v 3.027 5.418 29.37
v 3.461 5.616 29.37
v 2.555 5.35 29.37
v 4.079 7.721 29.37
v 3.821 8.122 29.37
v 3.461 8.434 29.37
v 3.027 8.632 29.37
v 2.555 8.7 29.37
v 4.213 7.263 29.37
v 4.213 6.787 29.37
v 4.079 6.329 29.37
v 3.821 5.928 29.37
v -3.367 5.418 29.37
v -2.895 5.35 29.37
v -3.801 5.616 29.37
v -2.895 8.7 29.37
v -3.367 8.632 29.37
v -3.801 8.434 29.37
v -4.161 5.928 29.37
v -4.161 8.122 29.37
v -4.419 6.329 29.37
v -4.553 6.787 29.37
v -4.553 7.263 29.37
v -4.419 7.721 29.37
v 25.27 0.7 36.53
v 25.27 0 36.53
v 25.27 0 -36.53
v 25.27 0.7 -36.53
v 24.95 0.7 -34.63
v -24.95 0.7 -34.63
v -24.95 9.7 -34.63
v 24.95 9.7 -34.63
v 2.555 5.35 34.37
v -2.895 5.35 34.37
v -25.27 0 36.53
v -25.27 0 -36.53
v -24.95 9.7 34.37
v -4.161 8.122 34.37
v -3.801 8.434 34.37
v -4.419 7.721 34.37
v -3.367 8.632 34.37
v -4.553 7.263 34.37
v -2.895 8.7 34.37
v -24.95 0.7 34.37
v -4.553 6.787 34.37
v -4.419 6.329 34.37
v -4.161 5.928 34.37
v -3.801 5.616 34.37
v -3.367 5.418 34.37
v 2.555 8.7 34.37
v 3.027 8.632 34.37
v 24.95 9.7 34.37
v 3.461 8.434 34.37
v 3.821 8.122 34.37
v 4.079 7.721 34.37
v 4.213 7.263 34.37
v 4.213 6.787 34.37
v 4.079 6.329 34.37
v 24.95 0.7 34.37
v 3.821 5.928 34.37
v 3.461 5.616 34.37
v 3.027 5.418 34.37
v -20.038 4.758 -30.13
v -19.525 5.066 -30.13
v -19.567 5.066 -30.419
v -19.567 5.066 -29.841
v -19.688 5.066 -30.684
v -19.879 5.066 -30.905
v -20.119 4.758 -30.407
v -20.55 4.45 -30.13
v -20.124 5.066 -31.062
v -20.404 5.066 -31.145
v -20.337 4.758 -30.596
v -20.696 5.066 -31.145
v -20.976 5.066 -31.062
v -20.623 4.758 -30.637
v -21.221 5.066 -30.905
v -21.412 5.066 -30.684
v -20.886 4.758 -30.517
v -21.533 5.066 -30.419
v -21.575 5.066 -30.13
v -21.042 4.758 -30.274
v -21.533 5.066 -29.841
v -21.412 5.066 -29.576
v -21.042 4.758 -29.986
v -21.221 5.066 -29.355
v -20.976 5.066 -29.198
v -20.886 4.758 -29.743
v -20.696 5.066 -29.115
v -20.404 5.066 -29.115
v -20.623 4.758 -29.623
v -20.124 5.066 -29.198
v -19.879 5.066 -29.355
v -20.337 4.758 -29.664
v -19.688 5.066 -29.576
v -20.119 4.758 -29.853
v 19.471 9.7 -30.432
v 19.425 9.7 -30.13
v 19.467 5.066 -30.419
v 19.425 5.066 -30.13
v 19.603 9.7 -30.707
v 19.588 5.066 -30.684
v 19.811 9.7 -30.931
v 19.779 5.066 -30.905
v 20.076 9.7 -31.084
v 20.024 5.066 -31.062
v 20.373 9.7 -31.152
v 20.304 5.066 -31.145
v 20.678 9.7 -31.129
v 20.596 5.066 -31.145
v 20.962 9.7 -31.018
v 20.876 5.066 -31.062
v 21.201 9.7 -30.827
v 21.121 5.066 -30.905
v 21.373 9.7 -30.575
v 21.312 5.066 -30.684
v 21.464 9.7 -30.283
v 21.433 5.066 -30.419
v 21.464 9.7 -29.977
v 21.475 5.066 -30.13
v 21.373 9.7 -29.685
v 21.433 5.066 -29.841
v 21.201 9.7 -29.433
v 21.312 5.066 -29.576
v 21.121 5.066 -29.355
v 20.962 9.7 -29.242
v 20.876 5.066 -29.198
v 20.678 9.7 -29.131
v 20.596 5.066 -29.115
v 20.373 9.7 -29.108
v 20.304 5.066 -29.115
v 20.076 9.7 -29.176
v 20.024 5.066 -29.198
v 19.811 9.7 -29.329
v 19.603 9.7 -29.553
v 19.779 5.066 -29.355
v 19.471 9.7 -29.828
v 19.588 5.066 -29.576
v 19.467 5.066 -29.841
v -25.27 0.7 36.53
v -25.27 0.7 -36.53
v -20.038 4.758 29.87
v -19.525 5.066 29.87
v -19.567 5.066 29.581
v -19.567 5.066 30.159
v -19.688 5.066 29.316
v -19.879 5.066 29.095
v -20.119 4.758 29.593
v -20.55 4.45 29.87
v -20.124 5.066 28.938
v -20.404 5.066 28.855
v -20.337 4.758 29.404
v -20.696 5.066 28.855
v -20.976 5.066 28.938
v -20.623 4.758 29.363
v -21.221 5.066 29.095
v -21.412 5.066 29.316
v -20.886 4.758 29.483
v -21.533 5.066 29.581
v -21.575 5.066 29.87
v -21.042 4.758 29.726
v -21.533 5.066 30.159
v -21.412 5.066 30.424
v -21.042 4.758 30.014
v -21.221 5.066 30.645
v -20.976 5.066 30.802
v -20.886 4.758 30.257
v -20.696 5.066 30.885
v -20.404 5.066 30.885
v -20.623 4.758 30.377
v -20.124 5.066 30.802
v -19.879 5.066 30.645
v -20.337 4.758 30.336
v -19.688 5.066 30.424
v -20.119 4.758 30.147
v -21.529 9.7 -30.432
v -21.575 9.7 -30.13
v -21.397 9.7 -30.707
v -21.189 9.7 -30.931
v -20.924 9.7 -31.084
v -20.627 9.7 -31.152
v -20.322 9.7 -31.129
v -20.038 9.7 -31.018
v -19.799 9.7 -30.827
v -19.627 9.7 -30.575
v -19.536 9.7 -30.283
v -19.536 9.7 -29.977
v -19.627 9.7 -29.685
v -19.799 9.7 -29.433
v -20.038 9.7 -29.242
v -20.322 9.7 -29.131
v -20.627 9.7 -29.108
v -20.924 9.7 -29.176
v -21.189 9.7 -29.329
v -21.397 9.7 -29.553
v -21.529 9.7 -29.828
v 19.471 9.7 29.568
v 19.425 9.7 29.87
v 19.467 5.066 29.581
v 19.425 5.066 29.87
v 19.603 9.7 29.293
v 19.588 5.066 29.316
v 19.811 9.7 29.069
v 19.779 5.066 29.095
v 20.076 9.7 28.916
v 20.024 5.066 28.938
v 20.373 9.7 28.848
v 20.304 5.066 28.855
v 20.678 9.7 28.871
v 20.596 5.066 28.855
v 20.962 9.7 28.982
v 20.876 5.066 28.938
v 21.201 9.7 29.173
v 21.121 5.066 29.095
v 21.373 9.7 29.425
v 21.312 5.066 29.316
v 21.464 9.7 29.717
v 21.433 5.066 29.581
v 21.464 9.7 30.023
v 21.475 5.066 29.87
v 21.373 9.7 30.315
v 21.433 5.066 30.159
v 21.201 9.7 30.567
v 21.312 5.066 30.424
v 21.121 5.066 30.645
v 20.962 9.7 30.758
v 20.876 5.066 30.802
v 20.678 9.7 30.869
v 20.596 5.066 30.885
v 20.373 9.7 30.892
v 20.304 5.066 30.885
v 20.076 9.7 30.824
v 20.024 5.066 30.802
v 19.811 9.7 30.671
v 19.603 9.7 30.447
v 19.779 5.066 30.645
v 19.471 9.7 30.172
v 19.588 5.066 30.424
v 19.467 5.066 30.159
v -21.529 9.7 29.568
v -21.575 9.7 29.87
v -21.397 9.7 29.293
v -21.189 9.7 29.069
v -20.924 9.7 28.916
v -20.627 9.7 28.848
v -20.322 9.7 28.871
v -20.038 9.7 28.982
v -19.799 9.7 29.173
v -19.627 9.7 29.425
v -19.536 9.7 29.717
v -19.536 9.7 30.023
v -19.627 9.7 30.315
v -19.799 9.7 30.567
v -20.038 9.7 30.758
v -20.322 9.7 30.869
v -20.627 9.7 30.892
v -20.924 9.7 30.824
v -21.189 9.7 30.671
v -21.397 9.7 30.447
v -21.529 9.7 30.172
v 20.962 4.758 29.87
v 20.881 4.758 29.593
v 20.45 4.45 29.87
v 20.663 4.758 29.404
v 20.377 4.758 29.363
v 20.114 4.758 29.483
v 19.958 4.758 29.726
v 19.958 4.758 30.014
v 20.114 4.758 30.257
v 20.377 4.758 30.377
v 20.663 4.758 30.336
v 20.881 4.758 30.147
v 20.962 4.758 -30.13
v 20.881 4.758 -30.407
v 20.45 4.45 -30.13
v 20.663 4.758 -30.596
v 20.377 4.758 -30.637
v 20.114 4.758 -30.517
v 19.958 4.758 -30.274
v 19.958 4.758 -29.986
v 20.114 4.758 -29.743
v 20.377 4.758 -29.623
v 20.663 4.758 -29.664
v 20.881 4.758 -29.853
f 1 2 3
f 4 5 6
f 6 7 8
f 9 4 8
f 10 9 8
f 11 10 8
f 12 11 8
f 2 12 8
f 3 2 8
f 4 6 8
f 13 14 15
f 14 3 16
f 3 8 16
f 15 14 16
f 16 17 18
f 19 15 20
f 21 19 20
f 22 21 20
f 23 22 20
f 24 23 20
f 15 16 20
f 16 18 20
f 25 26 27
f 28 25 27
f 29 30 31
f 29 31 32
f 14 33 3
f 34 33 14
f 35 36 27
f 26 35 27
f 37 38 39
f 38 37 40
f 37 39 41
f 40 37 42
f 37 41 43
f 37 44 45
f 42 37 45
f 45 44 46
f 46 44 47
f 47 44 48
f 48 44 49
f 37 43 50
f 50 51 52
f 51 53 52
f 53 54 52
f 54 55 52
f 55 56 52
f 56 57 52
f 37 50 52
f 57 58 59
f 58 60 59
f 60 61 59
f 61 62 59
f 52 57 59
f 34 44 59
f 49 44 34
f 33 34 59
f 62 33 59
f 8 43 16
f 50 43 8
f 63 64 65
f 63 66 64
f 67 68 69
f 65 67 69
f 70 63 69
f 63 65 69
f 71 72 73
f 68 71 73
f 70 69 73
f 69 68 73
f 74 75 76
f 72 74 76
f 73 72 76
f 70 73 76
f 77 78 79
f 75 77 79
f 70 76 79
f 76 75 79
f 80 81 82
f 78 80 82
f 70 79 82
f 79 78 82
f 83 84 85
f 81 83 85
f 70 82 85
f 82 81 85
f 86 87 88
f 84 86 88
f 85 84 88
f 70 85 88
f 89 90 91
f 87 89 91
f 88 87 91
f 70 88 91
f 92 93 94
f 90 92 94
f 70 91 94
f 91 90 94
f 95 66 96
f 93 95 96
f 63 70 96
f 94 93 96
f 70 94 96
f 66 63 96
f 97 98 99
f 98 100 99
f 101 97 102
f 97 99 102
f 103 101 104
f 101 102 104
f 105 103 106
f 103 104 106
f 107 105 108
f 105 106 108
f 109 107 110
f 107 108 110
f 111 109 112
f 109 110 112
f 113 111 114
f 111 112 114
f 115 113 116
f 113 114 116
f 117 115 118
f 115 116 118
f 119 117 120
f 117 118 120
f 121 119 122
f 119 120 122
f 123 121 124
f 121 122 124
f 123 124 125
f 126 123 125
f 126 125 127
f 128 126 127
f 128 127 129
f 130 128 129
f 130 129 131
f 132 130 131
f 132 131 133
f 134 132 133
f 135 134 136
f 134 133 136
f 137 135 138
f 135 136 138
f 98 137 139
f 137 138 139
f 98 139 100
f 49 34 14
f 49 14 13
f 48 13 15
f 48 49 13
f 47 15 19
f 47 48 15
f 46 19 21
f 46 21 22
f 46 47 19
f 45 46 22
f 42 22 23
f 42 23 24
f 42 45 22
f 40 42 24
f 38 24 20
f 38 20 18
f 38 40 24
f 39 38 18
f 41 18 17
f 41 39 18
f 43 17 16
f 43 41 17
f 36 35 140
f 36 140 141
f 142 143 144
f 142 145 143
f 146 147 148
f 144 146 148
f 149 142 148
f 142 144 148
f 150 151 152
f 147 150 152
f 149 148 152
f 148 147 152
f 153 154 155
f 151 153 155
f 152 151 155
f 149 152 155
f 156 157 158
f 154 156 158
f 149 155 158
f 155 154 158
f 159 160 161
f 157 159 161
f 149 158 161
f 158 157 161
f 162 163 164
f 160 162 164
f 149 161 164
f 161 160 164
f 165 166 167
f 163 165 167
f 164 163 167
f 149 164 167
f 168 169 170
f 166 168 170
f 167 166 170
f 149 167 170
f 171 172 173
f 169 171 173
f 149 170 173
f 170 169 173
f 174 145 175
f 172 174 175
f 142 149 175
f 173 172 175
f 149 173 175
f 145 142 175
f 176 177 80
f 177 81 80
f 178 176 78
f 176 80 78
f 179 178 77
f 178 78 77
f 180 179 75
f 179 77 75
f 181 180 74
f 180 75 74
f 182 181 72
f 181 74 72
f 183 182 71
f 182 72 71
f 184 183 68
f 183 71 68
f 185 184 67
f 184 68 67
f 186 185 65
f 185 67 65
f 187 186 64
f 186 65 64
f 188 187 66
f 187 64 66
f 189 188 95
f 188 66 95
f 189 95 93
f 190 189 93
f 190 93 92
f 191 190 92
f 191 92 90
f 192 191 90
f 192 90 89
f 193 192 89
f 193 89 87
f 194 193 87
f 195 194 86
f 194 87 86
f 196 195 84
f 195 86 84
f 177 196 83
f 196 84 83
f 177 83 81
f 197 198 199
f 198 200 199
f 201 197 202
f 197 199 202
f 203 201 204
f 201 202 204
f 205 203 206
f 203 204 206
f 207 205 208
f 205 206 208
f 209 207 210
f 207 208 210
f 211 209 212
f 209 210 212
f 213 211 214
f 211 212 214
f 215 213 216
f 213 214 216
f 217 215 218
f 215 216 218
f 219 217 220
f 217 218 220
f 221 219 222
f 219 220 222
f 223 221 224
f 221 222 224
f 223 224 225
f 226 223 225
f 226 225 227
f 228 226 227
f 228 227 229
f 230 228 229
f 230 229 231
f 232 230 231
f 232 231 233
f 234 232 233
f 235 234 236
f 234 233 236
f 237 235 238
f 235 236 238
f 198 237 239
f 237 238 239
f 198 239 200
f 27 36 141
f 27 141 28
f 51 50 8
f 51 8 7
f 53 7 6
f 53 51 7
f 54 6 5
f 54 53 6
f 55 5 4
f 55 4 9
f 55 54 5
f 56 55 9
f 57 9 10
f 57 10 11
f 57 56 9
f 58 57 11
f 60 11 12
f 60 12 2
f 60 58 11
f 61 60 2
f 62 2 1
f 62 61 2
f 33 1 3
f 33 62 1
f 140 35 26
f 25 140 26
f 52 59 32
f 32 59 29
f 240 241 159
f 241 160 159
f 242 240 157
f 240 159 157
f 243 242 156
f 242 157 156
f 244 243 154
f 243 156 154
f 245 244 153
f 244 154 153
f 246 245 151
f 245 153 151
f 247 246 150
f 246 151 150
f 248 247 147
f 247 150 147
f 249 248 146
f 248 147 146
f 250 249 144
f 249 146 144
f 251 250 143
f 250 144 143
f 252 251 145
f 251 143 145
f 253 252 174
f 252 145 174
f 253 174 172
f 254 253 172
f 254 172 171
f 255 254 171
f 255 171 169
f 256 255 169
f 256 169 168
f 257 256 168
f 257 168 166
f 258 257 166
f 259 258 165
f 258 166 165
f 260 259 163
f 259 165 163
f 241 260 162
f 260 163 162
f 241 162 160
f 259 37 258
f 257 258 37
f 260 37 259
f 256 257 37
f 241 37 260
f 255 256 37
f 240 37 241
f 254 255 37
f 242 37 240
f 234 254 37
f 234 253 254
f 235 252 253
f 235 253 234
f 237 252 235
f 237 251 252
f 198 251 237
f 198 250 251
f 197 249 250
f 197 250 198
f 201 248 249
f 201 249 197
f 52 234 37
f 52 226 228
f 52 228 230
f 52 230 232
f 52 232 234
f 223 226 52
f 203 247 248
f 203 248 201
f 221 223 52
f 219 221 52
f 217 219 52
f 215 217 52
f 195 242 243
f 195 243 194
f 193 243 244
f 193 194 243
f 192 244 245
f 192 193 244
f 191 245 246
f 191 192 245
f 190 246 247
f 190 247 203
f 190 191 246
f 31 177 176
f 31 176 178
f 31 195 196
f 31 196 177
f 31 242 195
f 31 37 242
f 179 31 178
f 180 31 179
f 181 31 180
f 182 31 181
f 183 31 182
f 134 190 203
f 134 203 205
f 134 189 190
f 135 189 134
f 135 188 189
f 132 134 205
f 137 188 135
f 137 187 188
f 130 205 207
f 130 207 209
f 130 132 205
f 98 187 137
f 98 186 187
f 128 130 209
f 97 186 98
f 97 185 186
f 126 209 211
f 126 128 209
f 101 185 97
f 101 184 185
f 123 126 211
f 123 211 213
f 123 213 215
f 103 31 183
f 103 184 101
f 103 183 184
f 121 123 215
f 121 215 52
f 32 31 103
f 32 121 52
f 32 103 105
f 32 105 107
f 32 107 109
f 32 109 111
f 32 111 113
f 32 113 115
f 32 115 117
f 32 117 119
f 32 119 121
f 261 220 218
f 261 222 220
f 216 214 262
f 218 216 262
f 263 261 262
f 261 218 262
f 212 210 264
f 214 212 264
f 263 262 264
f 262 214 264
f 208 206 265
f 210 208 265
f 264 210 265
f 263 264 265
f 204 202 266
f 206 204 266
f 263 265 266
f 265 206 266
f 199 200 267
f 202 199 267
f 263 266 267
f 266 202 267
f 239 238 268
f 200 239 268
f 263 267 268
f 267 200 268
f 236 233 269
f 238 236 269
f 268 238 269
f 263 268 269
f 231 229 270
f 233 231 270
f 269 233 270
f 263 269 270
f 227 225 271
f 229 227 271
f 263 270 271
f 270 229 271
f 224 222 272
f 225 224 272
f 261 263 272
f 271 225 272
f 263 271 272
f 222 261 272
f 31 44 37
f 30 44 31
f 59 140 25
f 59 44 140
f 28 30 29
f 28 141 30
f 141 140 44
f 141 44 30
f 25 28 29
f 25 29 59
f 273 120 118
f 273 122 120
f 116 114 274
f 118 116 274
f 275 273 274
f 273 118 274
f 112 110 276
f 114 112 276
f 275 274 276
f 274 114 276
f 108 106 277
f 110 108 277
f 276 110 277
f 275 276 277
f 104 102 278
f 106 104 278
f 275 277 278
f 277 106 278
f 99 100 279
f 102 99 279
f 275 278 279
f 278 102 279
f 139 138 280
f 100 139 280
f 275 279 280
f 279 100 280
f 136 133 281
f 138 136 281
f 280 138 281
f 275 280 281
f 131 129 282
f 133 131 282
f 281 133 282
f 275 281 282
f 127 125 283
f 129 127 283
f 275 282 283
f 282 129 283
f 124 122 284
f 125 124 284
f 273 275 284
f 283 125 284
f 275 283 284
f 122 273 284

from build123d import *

# Parameters (mm, degrees)
SKETCH_1_W               = 50.54
SKETCH_1_H               = 73.06
EXTRUDE_1_DEPTH          = 0.7
SKETCH_2_W               = 49.9
SKETCH_2_H               = 69
EXTRUDE_2_DEPTH          = 9
CUT_EXTRUDE_1_DEPTH      = 5
HOLE_WIZARD_M2_5_1_D     = 2.05
HOLE_WIZARD_M2_5_1_DEPTH = 4.634117865
HOLE_WIZARD_M2_5_1_TIP   = 0.615882135


with BuildPart() as part:
    # 草图1 → 凸台-拉伸1 (new body)
    with BuildSketch(Plane(origin=(0, 0, 0), x_dir=(1, 0, 0), z_dir=(0, 1, 0))):
        Rectangle(SKETCH_1_W, SKETCH_1_H)
    extrude(amount=EXTRUDE_1_DEPTH)

    # 草图2 → 凸台-拉伸2 (add)
    with BuildSketch(Plane(origin=(0, 0.7, 0), x_dir=(1, 0, 0), z_dir=(0, 1, 0))):
        with Locations((0, 0.13)):
            Rectangle(SKETCH_2_W, SKETCH_2_H)
    extrude(amount=EXTRUDE_2_DEPTH)

    # 草图6 → 切除-拉伸1 (cut)
    with BuildSketch(Plane.XY.offset(34.37)):
        with BuildLine():
            Line((-2.895, 8.7), (2.555, 8.7))
            ThreePointArc((2.555, 8.7), (4.23, 7.025), (2.555, 5.35))
            Line((2.555, 5.35), (-2.895, 5.35))
            ThreePointArc((-2.895, 5.35), (-4.57, 7.025), (-2.895, 8.7))
        make_face()
    extrude(amount=-CUT_EXTRUDE_1_DEPTH, mode=Mode.SUBTRACT)

    # M2.5 螺纹孔1
    with Locations(Plane(origin=(0, 9.7, 0), x_dir=(1, 0, 0), z_dir=(0, 1, 0))):
        with Locations((-20.55, 30.13), (20.45, 30.13), (20.45, -29.87), (-20.55, -29.87)):
            Hole(HOLE_WIZARD_M2_5_1_D / 2, depth=HOLE_WIZARD_M2_5_1_DEPTH)
            with Locations((0, 0, -(HOLE_WIZARD_M2_5_1_DEPTH + HOLE_WIZARD_M2_5_1_TIP / 2))):  # 118° drill point
                Cone(0, HOLE_WIZARD_M2_5_1_D / 2, HOLE_WIZARD_M2_5_1_TIP, mode=Mode.SUBTRACT)


solid = part.part
